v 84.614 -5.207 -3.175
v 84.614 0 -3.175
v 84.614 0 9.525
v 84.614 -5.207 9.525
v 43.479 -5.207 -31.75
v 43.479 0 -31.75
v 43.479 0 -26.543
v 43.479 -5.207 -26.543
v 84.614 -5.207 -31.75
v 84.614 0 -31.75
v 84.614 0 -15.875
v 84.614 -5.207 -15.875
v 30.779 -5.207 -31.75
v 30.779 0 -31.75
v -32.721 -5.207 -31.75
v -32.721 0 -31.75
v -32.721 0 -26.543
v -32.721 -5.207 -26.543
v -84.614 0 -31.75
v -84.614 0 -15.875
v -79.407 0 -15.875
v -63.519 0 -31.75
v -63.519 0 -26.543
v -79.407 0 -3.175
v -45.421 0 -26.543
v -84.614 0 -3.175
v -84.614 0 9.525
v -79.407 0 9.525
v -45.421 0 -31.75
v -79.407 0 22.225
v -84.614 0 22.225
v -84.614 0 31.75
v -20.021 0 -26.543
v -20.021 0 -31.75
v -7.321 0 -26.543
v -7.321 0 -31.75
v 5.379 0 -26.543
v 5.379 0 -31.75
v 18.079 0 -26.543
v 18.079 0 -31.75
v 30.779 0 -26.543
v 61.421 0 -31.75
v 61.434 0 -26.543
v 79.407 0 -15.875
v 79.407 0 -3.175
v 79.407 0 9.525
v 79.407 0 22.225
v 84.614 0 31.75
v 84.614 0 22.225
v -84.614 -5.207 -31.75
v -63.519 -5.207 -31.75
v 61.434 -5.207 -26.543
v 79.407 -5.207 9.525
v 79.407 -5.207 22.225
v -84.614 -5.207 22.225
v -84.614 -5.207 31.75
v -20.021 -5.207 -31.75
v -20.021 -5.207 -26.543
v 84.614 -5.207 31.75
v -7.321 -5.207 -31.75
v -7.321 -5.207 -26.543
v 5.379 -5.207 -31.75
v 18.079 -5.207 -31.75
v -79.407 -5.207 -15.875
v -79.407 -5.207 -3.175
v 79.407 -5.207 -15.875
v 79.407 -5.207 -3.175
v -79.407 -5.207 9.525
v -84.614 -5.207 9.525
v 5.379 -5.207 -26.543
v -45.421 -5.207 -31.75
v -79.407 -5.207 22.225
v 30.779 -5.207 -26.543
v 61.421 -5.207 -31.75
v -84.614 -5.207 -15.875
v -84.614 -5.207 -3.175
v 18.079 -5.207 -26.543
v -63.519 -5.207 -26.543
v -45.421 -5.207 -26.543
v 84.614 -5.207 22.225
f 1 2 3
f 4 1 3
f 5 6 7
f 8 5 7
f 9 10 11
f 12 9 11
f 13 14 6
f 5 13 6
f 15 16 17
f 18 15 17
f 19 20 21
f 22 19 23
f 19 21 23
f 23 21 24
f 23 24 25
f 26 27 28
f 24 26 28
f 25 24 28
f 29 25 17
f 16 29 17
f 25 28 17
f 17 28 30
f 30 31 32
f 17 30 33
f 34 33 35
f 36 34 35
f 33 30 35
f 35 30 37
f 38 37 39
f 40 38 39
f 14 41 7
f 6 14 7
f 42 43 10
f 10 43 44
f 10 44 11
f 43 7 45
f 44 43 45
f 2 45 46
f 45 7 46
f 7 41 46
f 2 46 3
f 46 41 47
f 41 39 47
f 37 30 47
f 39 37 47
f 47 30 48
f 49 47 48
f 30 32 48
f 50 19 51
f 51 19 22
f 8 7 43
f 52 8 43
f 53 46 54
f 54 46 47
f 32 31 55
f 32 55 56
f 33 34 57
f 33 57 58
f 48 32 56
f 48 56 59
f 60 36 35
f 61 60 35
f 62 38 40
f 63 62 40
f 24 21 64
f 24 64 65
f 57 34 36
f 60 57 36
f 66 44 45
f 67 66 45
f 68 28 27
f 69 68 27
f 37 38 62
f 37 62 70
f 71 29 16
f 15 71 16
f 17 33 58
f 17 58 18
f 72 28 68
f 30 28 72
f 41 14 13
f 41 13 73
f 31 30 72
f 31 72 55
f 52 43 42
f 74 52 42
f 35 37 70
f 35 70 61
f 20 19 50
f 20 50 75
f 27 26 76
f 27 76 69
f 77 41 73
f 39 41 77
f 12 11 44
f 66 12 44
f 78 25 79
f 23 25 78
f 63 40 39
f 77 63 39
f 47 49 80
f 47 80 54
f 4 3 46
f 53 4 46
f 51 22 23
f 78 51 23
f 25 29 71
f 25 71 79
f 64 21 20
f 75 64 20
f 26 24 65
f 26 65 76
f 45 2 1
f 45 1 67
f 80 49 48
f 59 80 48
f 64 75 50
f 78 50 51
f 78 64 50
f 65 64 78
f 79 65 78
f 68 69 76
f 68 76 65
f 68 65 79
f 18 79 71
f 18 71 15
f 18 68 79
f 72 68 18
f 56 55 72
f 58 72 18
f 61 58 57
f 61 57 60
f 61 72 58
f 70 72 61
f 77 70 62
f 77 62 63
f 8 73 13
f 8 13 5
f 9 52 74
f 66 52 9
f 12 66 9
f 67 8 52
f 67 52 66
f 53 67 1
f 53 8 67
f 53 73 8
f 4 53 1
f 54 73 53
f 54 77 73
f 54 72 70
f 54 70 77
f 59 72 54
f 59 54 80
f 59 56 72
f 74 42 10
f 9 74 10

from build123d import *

# Parameters (mm, degrees)
F0_W     = 169.2275
F0_H     = 63.5
F1_DEPTH = 5.207
F2_W     = 5.207
F2_H     = 12.7
F2_W_2   = 12.7
F2_H_2   = 5.207
F2_W_3   = 18.097754
F3_DEPTH = 5.208


# Not quite as in the source:
# - a feature names something its author has since deleted; it is built from what else it names


with BuildPart() as f1:
    # F0 (on Front) → F1 (new body)
    with BuildSketch(Plane.XZ):
        Rectangle(F0_W, F0_H)
    extrude(amount=F1_DEPTH)

    # F2 (on face) → F3 (cut, through all)
    with BuildSketch(Plane(origin=(0, 0, 0), x_dir=(-1, 0, 0), z_dir=(0, 1, 0))):
        with Locations((-82.01025, 15.875)):
            Rectangle(F2_W, F2_H)
        with Locations((-82.01025, -9.525)):
            Rectangle(F2_W, F2_H)
        Polygon((-61.42101, -31.75), (-43.478704, -31.75), (-43.478704, -26.543), (-61.43371, -26.543), align=None)
        with Locations((-24.428704, -29.1465)):
            Rectangle(F2_W_2, F2_H_2)
        with Locations((0.971296, -29.1465)):
            Rectangle(F2_W_2, F2_H_2)
        with Locations((26.371296, -29.1465)):
            Rectangle(F2_W_2, F2_H_2)
        with Locations((54.470173, -29.1465)):
            Rectangle(F2_W_3, F2_H_2)
        with Locations((82.01025, 15.875)):
            Rectangle(F2_W, F2_H)
        with Locations((82.01025, -9.525)):
            Rectangle(F2_W, F2_H)
    extrude(amount=-F3_DEPTH, mode=Mode.SUBTRACT)


solid = f1.part
